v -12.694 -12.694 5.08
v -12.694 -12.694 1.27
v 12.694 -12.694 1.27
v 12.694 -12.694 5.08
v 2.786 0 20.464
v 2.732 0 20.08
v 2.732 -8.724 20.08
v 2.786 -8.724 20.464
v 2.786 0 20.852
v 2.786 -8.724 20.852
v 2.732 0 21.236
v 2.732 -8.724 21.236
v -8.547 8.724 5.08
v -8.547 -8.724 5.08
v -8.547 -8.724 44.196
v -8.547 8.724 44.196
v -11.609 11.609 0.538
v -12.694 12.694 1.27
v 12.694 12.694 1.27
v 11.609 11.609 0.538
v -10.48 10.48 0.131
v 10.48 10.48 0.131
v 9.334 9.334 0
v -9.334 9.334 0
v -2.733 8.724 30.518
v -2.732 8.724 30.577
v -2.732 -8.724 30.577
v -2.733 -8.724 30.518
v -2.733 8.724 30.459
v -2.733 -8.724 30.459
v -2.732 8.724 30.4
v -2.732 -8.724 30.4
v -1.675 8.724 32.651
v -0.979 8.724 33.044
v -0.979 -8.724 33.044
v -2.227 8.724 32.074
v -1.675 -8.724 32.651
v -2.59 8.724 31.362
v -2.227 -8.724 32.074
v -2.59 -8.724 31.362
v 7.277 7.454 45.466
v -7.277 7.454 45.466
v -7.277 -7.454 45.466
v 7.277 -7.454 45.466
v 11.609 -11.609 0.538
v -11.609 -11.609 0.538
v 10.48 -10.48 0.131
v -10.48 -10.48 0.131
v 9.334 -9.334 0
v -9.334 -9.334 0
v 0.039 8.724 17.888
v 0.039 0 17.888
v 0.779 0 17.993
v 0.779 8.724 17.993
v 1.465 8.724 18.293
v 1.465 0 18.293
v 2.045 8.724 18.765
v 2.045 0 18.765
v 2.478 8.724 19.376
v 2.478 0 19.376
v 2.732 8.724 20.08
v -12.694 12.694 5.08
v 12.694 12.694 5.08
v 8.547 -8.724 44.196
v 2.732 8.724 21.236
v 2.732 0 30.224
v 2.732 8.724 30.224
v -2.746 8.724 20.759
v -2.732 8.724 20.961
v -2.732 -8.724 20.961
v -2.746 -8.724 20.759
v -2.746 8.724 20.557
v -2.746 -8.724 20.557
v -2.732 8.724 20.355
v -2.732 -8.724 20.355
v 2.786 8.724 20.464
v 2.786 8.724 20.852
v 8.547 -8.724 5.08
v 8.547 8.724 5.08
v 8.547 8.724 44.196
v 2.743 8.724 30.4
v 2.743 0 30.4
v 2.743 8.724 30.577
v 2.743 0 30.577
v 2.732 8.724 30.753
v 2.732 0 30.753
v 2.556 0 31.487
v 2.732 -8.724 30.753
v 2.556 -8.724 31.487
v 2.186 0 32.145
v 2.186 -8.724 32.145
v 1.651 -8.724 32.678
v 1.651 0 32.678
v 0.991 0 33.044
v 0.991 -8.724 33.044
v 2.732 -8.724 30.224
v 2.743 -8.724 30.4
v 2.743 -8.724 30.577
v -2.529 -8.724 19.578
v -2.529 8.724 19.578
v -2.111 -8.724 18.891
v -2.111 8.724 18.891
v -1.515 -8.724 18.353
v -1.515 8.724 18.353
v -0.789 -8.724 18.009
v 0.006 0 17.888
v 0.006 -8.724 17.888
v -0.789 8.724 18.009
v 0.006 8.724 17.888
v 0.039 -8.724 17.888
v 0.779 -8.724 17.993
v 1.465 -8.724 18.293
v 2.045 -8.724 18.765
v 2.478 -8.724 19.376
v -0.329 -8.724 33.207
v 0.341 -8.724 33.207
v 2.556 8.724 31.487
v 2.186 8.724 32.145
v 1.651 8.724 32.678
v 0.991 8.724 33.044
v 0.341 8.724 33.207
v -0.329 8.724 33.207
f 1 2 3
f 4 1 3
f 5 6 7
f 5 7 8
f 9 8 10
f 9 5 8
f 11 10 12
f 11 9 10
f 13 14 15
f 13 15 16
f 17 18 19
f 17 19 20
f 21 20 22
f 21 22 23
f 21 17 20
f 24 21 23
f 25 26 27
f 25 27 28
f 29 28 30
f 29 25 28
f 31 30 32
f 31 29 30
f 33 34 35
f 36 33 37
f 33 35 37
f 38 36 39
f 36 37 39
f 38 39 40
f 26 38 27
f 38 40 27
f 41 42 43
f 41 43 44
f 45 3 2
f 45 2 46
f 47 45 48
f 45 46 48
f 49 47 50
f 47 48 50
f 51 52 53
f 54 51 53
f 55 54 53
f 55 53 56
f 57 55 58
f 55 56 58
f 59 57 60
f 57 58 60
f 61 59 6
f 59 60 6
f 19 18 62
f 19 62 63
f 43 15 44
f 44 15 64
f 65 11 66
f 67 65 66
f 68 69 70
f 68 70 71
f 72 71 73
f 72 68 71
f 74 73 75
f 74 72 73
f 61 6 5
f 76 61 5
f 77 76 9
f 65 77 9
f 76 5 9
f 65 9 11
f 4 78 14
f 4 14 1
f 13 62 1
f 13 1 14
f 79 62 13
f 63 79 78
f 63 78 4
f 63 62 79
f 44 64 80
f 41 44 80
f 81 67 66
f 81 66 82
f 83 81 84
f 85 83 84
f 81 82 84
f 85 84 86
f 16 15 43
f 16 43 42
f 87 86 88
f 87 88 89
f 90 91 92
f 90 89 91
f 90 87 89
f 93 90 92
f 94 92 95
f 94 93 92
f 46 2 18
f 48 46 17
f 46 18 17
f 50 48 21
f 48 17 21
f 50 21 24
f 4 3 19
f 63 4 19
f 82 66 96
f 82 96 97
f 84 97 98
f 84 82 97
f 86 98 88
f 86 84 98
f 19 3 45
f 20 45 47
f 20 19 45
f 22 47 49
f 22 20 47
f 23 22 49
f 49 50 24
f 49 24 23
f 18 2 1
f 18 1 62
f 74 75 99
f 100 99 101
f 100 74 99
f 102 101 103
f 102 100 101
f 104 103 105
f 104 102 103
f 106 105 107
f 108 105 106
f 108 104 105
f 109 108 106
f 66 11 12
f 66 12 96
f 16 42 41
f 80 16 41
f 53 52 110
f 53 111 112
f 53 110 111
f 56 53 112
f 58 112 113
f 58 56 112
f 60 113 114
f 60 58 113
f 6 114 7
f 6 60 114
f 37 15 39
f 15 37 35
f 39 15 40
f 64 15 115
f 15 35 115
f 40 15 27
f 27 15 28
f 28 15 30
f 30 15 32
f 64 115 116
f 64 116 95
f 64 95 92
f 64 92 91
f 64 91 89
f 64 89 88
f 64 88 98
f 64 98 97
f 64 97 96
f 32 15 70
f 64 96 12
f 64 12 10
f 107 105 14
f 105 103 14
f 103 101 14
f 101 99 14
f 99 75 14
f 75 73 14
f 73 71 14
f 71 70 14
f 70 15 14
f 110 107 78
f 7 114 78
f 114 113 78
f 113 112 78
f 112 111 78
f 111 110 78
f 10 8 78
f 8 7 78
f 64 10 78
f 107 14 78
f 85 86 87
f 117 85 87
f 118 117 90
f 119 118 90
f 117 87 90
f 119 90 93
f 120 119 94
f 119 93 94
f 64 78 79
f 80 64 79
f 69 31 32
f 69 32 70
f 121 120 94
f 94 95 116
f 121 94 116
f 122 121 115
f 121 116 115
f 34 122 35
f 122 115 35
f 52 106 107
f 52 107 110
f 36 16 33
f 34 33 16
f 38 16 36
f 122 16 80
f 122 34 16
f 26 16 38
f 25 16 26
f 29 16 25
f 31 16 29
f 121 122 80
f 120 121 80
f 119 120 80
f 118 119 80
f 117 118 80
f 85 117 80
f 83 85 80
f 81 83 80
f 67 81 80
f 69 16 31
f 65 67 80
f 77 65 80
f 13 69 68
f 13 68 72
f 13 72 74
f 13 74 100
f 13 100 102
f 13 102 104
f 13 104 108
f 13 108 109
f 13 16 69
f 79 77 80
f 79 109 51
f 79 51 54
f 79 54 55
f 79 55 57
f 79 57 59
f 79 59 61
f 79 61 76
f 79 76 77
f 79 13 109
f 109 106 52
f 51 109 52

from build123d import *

# Parameters (mm, degrees)
F0_W        = 25.3882817924
F0_H        = 25.3883041441
F1_DEPTH    = 5.08
F2_W        = 17.0946475118
F2_H        = 17.4471139908
F3_DEPTH    = 45.466
F5_DEPTH    = 25.4
F6_DEPTH    = 25.4
F7_SIZE     = 1.27
F8_SIZE     = 1.27
F9_T1_DEPTH = 33.2988026177
F9_T3_DEPTH = 33.2988249694


# Not quite as in the source:
# - a fillet or chamfer that OpenCascade refuses, or shapes differently, is made with other operations: its cross-section is extruded or revolved along the edge and cut away or added


with BuildPart() as f1:
    # F0 (on Top) → F1 (new body)
    with BuildSketch(Plane.XY):
        Rectangle(F0_W, F0_H)
    extrude(amount=F1_DEPTH)

    # F2 (on Top) → F3 (join)
    with BuildSketch(Plane.XY):
        Rectangle(F2_W, F2_H)
    extrude(amount=F3_DEPTH)

    # F4 (on Front) → F5 (cut)
    with BuildSketch(Plane.XZ):
        with BuildLine():
            ThreePointArc((-2.7316187043, 20.3549675643), (-1.8326762864, 18.6002154817), (0.0056849059, 17.8876984864))
            Line((0.0056849059, 17.8876984864), (0.0386628839, 17.8876984864))
            ThreePointArc((0.0386628839, 17.8876984864), (1.7712415134, 18.5095830103), (2.7316187043, 20.0800112066))
            Line((2.7316187043, 20.0800112066), (2.7316187043, 21.236134693))
            Line((2.7316187043, 21.236134693), (2.7316187043, 30.2240438759))
            Line((2.7316187043, 30.2240438759), (2.7316187043, 30.752742663))
            ThreePointArc((2.7316187043, 30.752742663), (2.1863530417, 32.1452825707), (0.9908690064, 33.0437812954))
            Line((0.9908690064, 33.0437812954), (-0.9794991946, 33.0437812954))
            ThreePointArc((-0.9794991946, 33.0437812954), (-2.2272694516, 32.0741140874), (-2.7316187043, 30.5765103549))
            Line((-2.7316187043, 30.5765103549), (-2.7316187043, 30.4002761841))
            Line((-2.7316187043, 30.4002761841), (-2.7316187043, 20.9611783353))
            Line((-2.7316187043, 20.9611783353), (-2.7316187043, 20.3549675643))
        make_face()
        with BuildLine():
            ThreePointArc((-2.7316187043, 20.9611783353), (-2.7482496384, 20.6580729498), (-2.7316187043, 20.3549675643))
            Line((-2.7316187043, 20.3549675643), (-2.7316187043, 20.9611783353))
        make_face()
        with BuildLine():
            Line((2.7316187043, 21.236134693), (2.7316187043, 20.0800112066))
            ThreePointArc((2.7316187043, 20.0800112066), (2.7925974282, 20.6580729498), (2.7316187043, 21.236134693))
        make_face()
        with BuildLine():
            ThreePointArc((-2.7316187043, 30.5765103549), (-2.7330366343, 30.4883932695), (-2.7316187043, 30.4002761841))
            Line((-2.7316187043, 30.4002761841), (-2.7316187043, 30.5765103549))
        make_face()
        with BuildLine():
            Line((2.7316187043, 30.752742663), (2.7316187043, 30.2240438759))
            ThreePointArc((2.7316187043, 30.2240438759), (2.7444064461, 30.4883932695), (2.7316187043, 30.752742663))
        make_face()
        with BuildLine():
            ThreePointArc((0.9908690064, 33.0437812954), (0.0056849059, 33.2271148097), (-0.9794991946, 33.0437812954))
            Line((-0.9794991946, 33.0437812954), (0.9908690064, 33.0437812954))
        make_face()
    extrude(amount=-F5_DEPTH, mode=Mode.SUBTRACT)

    # F6 (cut): a face of the model
    f6_faces = [f1.faces().sort_by_distance(p)[0] for p in [
        (0.0051043388, 0, 25.5481593175),
    ]]
    extrude(f6_faces, amount=-F6_DEPTH, mode=Mode.SUBTRACT)

    # F7
    f7_edges = [f1.edges().sort_by_distance(p)[0] for p in [
        (0, -12.694152, 0),
        (12.694141, 0, 0),
        (-12.694141, 0, 0),
        (0, 12.694152, 0),
    ]]
    chamfer(f7_edges, length=F7_SIZE)

    # F8
    f8_edges = [f1.edges().sort_by_distance(p)[0] for p in [
        (0, 8.723557, 45.466),
        (-8.547324, 0, 45.466),
        (0, -8.723557, 45.466),
        (8.547324, 0, 45.466),
    ]]
    chamfer(f8_edges, length=F8_SIZE)

    # F9: fillet of radius 5.08 on 4 edges, made by hand

    # F9_s2 → F9_t1 (cut)
    with BuildSketch(Plane.YZ.offset(-16.6494013088)):
        with BuildLine():
            ThreePointArc((-12.6941520721, 1.27), (-11.1300991312, 0.3280951188), (-9.334047907, 0))
            Line((-9.334047907, 0), (-11.4241520721, 0))
            Line((-11.4241520721, 0), (-12.6941520721, 1.27))
        make_face()
        with BuildLine():
            ThreePointArc((12.6941520721, 1.27), (11.1300991312, 0.3280951188), (9.334047907, 0))
            Line((9.334047907, 0), (11.4241520721, 0))
            Line((11.4241520721, 0), (12.6941520721, 1.27))
        make_face()
    extrude(amount=F9_T1_DEPTH, mode=Mode.SUBTRACT)

    # F9_s4 → F9_t3 (cut)
    with BuildSketch(Plane.XZ.offset(-16.6494124847)):
        with BuildLine():
            ThreePointArc((12.6941408962, 1.27), (11.1300879554, 0.3280951188), (9.3340367311, 0))
            Line((9.3340367311, 0), (11.4241408962, 0))
            Line((11.4241408962, 0), (12.6941408962, 1.27))
        make_face()
        with BuildLine():
            ThreePointArc((-12.6941408962, 1.27), (-11.1300879554, 0.3280951188), (-9.3340367311, 0))
            Line((-9.3340367311, 0), (-11.4241408962, 0))
            Line((-11.4241408962, 0), (-12.6941408962, 1.27))
        make_face()
    extrude(amount=F9_T3_DEPTH, mode=Mode.SUBTRACT)


solid = f1.part
